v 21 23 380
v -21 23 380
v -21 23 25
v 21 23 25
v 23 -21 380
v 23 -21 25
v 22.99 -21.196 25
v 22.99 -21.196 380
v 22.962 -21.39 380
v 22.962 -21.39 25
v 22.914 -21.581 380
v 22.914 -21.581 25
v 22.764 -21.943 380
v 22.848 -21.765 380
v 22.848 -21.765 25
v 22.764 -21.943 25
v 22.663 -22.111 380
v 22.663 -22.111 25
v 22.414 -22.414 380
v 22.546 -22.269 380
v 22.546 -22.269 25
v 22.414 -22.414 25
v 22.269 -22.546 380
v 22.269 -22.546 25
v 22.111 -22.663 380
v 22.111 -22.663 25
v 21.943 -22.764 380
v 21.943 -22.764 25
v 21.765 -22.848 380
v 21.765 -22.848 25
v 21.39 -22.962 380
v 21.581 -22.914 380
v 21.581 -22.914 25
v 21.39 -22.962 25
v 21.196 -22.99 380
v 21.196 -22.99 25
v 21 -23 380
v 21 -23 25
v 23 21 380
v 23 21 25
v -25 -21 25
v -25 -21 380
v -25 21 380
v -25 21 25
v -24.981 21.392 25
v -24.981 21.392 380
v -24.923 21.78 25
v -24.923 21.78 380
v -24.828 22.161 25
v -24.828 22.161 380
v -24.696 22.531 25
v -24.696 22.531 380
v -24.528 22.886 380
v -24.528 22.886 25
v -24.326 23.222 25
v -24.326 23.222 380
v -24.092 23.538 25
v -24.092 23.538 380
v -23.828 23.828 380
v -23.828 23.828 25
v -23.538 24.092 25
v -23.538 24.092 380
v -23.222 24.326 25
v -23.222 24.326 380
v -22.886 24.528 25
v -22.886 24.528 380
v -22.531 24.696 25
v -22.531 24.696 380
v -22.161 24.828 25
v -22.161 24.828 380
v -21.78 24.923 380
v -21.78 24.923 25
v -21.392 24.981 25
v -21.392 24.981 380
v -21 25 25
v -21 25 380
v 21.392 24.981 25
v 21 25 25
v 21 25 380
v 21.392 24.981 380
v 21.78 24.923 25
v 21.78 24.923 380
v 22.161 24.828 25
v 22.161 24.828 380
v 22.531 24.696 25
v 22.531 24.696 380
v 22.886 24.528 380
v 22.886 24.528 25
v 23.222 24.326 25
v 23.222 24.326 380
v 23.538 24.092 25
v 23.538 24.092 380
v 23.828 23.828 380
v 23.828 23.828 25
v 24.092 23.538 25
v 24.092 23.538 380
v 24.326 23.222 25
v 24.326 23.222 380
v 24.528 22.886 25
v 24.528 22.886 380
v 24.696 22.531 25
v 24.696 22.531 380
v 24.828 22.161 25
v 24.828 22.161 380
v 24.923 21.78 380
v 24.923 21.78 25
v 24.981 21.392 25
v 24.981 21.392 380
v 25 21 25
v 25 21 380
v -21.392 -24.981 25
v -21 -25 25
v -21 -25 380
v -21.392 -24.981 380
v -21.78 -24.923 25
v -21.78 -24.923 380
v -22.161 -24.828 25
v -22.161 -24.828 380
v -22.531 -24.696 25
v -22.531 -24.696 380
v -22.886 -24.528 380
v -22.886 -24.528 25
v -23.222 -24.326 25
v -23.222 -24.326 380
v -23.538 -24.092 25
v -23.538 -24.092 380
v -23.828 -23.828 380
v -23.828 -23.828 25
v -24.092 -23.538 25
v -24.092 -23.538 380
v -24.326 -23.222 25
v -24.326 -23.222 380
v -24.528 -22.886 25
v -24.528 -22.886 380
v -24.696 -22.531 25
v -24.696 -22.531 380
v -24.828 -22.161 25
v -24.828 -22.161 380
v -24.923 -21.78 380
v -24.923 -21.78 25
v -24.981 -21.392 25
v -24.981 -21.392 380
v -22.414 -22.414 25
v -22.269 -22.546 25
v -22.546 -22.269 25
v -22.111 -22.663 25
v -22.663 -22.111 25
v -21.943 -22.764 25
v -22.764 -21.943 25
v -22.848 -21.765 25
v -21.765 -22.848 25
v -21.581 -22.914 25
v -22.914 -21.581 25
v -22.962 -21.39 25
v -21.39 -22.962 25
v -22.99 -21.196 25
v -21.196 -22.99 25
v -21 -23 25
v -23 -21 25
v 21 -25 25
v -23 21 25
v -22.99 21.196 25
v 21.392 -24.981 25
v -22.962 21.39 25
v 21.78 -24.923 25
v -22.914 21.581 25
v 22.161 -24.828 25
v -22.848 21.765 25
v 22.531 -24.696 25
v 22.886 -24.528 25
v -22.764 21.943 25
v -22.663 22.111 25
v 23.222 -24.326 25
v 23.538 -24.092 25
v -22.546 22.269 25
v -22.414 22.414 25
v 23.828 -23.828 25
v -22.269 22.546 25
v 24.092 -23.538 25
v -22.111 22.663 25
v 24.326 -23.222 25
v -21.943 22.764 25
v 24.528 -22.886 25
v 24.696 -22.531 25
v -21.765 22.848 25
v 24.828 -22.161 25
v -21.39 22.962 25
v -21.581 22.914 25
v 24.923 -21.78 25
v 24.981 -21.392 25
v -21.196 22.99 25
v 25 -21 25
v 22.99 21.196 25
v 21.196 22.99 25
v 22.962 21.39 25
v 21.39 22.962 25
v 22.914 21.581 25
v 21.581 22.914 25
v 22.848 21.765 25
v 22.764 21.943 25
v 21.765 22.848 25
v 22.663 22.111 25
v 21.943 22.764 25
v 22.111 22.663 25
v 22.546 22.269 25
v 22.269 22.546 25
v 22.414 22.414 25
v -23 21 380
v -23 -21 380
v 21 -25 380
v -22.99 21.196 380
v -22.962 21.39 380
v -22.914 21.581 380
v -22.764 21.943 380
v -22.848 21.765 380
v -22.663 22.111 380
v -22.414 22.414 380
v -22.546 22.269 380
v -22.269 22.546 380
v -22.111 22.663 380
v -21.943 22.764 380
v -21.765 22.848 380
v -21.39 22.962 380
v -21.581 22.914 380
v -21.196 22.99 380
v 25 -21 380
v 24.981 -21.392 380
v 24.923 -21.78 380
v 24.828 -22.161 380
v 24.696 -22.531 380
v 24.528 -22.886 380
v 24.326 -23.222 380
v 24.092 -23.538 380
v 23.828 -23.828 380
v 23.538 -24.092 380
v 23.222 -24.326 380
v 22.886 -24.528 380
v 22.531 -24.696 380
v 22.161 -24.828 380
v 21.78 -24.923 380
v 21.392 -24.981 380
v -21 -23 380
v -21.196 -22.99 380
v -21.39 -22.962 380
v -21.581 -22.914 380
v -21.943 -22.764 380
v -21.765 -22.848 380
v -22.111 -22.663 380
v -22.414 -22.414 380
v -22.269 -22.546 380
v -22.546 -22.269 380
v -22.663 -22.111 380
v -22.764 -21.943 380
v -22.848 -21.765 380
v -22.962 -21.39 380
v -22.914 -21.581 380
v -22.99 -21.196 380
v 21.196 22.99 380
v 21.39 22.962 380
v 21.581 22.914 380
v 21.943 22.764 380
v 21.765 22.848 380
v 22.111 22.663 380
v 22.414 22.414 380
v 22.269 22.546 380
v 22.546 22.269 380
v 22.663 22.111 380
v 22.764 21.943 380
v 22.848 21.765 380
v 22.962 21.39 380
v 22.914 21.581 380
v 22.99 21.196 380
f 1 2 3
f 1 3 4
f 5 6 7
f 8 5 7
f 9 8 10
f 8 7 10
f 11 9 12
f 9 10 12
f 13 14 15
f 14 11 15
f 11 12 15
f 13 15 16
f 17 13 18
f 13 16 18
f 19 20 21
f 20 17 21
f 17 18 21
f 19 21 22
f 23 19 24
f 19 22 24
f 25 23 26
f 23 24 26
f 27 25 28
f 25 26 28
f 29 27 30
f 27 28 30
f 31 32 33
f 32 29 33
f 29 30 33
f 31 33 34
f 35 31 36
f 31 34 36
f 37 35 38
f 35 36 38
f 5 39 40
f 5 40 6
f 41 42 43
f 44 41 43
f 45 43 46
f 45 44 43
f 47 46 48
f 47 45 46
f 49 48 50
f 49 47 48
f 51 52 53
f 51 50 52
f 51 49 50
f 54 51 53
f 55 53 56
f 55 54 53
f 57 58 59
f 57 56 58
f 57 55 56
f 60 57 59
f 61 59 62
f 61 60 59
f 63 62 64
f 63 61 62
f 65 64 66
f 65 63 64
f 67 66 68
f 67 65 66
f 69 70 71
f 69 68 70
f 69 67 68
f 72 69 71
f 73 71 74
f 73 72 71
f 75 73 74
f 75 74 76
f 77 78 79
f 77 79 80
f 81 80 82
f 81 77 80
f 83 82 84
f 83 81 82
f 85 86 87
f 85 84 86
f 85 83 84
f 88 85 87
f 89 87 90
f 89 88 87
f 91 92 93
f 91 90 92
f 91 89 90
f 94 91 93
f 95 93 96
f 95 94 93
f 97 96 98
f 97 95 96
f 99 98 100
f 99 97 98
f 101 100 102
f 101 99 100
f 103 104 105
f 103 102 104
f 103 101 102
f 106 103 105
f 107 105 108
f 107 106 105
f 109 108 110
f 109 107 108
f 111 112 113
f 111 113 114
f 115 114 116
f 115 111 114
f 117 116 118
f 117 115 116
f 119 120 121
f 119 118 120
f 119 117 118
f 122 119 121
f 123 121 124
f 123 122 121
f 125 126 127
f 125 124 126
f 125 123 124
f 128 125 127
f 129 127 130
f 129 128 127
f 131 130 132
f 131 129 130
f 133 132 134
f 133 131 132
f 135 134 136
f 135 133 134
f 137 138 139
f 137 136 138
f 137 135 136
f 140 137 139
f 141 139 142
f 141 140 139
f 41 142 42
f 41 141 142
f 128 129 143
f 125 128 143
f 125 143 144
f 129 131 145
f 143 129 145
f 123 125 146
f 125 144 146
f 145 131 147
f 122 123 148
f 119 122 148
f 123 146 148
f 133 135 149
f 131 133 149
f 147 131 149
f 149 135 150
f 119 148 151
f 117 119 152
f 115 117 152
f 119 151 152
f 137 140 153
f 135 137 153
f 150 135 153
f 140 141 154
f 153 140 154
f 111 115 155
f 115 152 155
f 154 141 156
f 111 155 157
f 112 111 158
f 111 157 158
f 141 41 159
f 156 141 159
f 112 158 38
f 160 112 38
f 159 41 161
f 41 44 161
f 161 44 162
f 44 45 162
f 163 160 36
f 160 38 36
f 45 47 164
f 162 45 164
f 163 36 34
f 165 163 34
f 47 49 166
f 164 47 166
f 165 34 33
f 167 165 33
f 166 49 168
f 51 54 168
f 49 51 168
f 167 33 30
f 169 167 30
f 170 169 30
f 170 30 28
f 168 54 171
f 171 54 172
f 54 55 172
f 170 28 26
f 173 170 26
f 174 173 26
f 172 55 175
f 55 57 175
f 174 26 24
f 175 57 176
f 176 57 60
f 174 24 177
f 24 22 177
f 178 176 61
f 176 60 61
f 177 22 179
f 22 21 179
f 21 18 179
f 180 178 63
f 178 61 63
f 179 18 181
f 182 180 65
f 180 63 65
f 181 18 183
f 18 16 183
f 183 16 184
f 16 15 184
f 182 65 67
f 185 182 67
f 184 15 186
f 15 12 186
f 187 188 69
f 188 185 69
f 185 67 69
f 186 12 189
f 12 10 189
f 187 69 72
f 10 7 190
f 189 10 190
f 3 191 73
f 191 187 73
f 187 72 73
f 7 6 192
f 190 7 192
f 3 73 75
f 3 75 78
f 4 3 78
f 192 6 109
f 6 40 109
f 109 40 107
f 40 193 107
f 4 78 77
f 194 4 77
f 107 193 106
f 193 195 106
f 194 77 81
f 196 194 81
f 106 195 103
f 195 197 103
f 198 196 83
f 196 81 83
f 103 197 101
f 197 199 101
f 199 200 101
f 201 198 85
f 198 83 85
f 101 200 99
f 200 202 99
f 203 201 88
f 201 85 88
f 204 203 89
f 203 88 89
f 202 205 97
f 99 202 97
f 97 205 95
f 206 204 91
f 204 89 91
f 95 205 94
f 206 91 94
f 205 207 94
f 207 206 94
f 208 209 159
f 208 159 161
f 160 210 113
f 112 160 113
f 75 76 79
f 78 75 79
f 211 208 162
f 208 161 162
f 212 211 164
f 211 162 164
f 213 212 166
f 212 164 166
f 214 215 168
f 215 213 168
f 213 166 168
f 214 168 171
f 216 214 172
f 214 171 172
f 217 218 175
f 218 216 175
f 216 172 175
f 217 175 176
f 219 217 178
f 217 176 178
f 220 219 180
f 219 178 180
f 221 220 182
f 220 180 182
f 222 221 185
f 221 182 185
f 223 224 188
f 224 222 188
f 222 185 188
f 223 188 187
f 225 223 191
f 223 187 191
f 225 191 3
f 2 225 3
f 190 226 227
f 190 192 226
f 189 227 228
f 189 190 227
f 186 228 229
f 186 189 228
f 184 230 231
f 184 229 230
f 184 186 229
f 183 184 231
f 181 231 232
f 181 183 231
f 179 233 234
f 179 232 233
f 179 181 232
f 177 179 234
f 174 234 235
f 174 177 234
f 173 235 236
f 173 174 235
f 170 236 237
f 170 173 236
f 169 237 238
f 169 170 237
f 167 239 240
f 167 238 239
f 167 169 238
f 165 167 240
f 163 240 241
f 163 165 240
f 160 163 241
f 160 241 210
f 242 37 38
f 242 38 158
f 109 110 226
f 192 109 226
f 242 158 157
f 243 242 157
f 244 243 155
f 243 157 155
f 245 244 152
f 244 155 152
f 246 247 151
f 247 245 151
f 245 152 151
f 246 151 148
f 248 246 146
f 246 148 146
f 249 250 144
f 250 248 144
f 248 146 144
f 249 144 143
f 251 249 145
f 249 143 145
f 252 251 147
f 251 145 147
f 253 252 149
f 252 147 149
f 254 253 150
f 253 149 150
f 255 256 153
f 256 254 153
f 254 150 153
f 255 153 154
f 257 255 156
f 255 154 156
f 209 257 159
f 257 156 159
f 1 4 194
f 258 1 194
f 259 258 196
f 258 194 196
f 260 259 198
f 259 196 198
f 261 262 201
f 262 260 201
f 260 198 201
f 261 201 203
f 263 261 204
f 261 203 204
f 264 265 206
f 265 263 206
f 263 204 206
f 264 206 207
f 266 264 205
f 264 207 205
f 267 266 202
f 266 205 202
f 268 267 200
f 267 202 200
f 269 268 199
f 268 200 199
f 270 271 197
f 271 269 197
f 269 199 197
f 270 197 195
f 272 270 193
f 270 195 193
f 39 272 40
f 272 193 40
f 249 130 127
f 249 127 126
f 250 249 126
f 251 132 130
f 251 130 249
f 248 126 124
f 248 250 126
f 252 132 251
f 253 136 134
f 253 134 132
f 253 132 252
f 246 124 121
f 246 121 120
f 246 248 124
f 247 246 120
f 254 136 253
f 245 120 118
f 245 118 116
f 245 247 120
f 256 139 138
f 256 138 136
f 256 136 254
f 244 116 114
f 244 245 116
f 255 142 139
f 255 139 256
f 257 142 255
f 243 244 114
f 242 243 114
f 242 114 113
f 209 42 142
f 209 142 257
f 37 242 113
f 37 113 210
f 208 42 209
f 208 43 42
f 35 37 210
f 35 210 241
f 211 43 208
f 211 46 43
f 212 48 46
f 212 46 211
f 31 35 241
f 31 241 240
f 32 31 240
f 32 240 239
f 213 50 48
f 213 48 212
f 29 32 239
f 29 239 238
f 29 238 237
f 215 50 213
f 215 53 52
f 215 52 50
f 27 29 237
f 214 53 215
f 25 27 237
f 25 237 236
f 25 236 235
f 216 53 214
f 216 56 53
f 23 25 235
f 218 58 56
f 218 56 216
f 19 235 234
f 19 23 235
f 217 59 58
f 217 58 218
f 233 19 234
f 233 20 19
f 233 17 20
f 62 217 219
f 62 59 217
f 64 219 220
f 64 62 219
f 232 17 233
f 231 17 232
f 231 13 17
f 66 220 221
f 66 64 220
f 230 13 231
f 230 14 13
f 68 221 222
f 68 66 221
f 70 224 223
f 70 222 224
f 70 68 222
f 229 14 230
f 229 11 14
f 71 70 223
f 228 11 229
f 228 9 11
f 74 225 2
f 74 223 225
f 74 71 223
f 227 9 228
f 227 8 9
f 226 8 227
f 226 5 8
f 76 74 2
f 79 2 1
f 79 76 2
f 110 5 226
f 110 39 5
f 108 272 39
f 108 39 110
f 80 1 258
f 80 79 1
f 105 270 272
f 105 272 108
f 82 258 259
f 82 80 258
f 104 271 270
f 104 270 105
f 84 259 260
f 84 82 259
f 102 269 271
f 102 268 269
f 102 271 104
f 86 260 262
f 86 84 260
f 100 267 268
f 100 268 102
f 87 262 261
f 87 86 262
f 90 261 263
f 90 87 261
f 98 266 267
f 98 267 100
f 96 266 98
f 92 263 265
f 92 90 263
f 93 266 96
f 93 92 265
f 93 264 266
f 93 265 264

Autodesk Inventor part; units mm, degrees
ref_plane "Plano inicial" through (0, 0, 25) normal (0, 0, 1) x (1, 0, 0)
ref_plane "Plano final" through (0, 0, 380) normal (0, 0, 1) x (1, 0, 0)
sketch "Boceto" plane through (0, 0, 0) normal (0, 0, 1) x (1, 0, 0)
  line L0 (-25, -21) -> (-25, 21)
  line L1 (-21, 25) -> (21, 25)
  line L2 (25, 21) -> (25, -21)
  line L3 (21, -25) -> (-21, -25)
  arc A0 (-25, -21) -> (-21, -25) centre (-21, -21) ccw
  arc A1 (25, 21) -> (21, 25) centre (21, 21) ccw
  arc A2 (-21, 25) -> (-25, 21) centre (-21, 21) ccw
  arc A3 (21, -25) -> (25, -21) centre (21, -21) ccw
  arc A4 (-21, 23) -> (-23, 21) centre (-21, 21) ccw
  line L4 (-21, 23) -> (21, 23)
  arc A5 (23, 21) -> (21, 23) centre (21, 21) ccw
  line L5 (23, 21) -> (23, -21)
  arc A6 (21, -23) -> (23, -21) centre (21, -21) ccw
  line L6 (21, -23) -> (-21, -23)
  arc A7 (-23, -21) -> (-21, -23) centre (-21, -21) ccw
  line L7 (-23, -21) -> (-23, 21)
  line L8 (0, 36.1598) -> (0, -36.1598) construction
  line L9 (-36.1598, 0) -> (36.1598, 0) construction
  dimension "d7" = 4
  dimension "d9" = 50
  dimension "d11" = 50
  dimension "d12" = 2
  dimension "d15" = 25
  dimension "d16" = 25
extrude "Cuerpo" add sketch "Boceto" along normal up to surface (355 mm away) from surface at 25
sketch "Sketch3" plane through (0, 0, 0) normal (0, 0, 1) x (1, 0, 0)
  line L0 (0, 0) -> (10, 0)
ref_plane "Work Plane3" through (0, 0, 0) normal (0, -1, 0) x (1, 0, 0)
sketch "Sketch4" plane through (0, 0, 0) normal (0, -1, 0) x (1, 0, 0)
  line L0 (-2, 25) -> (12, 25)
  line L1 (-2, 380) -> (12, 380)
  dimension "d18" = 355
ref_plane "Plano de trabajo4" through (-350.06, 21, 380) normal (0, 0, 1) x (1, 0, 0)
split "Dividir1" plane through (-350.06, 21, 380) removes the side toward (0, 0, 1)
ref_plane "Plano de trabajo5" through (-350.06, -21, 25) normal (0, 0, -1) x (-1, 0, 0)
split "Dividir2" plane through (-350.06, -21, 25) removes the side toward (0, 0, -1)
equation "\"d7\" = G_IR"
equation "\"d9\" = G_W"
equation "\"d11\" = G_H"
equation "\"d12\" = G_T"
equation "\"d15\" = 0.5 * d9"
equation "\"d16\" = 0.5 * d11"
equation "\"d3\" = G_L"
equation "\"G_W\" = 50"
equation "\"G_H\" = 50"
equation "\"G_T\" = 2"
equation "\"G_IR\" = 4"
equation "\"G_L\" = d18"
equation "\"G_OFFSET_START\" = -25"
equation "\"G_OFFSET_END\" = -25"
equation "\"d13\" = -G_OFFSET_START"
equation "\"B_L\" = 405"
properties part number "ISO 10799-2 - 50x50x2 - 355" material "Galvanizado catalogo 1"
